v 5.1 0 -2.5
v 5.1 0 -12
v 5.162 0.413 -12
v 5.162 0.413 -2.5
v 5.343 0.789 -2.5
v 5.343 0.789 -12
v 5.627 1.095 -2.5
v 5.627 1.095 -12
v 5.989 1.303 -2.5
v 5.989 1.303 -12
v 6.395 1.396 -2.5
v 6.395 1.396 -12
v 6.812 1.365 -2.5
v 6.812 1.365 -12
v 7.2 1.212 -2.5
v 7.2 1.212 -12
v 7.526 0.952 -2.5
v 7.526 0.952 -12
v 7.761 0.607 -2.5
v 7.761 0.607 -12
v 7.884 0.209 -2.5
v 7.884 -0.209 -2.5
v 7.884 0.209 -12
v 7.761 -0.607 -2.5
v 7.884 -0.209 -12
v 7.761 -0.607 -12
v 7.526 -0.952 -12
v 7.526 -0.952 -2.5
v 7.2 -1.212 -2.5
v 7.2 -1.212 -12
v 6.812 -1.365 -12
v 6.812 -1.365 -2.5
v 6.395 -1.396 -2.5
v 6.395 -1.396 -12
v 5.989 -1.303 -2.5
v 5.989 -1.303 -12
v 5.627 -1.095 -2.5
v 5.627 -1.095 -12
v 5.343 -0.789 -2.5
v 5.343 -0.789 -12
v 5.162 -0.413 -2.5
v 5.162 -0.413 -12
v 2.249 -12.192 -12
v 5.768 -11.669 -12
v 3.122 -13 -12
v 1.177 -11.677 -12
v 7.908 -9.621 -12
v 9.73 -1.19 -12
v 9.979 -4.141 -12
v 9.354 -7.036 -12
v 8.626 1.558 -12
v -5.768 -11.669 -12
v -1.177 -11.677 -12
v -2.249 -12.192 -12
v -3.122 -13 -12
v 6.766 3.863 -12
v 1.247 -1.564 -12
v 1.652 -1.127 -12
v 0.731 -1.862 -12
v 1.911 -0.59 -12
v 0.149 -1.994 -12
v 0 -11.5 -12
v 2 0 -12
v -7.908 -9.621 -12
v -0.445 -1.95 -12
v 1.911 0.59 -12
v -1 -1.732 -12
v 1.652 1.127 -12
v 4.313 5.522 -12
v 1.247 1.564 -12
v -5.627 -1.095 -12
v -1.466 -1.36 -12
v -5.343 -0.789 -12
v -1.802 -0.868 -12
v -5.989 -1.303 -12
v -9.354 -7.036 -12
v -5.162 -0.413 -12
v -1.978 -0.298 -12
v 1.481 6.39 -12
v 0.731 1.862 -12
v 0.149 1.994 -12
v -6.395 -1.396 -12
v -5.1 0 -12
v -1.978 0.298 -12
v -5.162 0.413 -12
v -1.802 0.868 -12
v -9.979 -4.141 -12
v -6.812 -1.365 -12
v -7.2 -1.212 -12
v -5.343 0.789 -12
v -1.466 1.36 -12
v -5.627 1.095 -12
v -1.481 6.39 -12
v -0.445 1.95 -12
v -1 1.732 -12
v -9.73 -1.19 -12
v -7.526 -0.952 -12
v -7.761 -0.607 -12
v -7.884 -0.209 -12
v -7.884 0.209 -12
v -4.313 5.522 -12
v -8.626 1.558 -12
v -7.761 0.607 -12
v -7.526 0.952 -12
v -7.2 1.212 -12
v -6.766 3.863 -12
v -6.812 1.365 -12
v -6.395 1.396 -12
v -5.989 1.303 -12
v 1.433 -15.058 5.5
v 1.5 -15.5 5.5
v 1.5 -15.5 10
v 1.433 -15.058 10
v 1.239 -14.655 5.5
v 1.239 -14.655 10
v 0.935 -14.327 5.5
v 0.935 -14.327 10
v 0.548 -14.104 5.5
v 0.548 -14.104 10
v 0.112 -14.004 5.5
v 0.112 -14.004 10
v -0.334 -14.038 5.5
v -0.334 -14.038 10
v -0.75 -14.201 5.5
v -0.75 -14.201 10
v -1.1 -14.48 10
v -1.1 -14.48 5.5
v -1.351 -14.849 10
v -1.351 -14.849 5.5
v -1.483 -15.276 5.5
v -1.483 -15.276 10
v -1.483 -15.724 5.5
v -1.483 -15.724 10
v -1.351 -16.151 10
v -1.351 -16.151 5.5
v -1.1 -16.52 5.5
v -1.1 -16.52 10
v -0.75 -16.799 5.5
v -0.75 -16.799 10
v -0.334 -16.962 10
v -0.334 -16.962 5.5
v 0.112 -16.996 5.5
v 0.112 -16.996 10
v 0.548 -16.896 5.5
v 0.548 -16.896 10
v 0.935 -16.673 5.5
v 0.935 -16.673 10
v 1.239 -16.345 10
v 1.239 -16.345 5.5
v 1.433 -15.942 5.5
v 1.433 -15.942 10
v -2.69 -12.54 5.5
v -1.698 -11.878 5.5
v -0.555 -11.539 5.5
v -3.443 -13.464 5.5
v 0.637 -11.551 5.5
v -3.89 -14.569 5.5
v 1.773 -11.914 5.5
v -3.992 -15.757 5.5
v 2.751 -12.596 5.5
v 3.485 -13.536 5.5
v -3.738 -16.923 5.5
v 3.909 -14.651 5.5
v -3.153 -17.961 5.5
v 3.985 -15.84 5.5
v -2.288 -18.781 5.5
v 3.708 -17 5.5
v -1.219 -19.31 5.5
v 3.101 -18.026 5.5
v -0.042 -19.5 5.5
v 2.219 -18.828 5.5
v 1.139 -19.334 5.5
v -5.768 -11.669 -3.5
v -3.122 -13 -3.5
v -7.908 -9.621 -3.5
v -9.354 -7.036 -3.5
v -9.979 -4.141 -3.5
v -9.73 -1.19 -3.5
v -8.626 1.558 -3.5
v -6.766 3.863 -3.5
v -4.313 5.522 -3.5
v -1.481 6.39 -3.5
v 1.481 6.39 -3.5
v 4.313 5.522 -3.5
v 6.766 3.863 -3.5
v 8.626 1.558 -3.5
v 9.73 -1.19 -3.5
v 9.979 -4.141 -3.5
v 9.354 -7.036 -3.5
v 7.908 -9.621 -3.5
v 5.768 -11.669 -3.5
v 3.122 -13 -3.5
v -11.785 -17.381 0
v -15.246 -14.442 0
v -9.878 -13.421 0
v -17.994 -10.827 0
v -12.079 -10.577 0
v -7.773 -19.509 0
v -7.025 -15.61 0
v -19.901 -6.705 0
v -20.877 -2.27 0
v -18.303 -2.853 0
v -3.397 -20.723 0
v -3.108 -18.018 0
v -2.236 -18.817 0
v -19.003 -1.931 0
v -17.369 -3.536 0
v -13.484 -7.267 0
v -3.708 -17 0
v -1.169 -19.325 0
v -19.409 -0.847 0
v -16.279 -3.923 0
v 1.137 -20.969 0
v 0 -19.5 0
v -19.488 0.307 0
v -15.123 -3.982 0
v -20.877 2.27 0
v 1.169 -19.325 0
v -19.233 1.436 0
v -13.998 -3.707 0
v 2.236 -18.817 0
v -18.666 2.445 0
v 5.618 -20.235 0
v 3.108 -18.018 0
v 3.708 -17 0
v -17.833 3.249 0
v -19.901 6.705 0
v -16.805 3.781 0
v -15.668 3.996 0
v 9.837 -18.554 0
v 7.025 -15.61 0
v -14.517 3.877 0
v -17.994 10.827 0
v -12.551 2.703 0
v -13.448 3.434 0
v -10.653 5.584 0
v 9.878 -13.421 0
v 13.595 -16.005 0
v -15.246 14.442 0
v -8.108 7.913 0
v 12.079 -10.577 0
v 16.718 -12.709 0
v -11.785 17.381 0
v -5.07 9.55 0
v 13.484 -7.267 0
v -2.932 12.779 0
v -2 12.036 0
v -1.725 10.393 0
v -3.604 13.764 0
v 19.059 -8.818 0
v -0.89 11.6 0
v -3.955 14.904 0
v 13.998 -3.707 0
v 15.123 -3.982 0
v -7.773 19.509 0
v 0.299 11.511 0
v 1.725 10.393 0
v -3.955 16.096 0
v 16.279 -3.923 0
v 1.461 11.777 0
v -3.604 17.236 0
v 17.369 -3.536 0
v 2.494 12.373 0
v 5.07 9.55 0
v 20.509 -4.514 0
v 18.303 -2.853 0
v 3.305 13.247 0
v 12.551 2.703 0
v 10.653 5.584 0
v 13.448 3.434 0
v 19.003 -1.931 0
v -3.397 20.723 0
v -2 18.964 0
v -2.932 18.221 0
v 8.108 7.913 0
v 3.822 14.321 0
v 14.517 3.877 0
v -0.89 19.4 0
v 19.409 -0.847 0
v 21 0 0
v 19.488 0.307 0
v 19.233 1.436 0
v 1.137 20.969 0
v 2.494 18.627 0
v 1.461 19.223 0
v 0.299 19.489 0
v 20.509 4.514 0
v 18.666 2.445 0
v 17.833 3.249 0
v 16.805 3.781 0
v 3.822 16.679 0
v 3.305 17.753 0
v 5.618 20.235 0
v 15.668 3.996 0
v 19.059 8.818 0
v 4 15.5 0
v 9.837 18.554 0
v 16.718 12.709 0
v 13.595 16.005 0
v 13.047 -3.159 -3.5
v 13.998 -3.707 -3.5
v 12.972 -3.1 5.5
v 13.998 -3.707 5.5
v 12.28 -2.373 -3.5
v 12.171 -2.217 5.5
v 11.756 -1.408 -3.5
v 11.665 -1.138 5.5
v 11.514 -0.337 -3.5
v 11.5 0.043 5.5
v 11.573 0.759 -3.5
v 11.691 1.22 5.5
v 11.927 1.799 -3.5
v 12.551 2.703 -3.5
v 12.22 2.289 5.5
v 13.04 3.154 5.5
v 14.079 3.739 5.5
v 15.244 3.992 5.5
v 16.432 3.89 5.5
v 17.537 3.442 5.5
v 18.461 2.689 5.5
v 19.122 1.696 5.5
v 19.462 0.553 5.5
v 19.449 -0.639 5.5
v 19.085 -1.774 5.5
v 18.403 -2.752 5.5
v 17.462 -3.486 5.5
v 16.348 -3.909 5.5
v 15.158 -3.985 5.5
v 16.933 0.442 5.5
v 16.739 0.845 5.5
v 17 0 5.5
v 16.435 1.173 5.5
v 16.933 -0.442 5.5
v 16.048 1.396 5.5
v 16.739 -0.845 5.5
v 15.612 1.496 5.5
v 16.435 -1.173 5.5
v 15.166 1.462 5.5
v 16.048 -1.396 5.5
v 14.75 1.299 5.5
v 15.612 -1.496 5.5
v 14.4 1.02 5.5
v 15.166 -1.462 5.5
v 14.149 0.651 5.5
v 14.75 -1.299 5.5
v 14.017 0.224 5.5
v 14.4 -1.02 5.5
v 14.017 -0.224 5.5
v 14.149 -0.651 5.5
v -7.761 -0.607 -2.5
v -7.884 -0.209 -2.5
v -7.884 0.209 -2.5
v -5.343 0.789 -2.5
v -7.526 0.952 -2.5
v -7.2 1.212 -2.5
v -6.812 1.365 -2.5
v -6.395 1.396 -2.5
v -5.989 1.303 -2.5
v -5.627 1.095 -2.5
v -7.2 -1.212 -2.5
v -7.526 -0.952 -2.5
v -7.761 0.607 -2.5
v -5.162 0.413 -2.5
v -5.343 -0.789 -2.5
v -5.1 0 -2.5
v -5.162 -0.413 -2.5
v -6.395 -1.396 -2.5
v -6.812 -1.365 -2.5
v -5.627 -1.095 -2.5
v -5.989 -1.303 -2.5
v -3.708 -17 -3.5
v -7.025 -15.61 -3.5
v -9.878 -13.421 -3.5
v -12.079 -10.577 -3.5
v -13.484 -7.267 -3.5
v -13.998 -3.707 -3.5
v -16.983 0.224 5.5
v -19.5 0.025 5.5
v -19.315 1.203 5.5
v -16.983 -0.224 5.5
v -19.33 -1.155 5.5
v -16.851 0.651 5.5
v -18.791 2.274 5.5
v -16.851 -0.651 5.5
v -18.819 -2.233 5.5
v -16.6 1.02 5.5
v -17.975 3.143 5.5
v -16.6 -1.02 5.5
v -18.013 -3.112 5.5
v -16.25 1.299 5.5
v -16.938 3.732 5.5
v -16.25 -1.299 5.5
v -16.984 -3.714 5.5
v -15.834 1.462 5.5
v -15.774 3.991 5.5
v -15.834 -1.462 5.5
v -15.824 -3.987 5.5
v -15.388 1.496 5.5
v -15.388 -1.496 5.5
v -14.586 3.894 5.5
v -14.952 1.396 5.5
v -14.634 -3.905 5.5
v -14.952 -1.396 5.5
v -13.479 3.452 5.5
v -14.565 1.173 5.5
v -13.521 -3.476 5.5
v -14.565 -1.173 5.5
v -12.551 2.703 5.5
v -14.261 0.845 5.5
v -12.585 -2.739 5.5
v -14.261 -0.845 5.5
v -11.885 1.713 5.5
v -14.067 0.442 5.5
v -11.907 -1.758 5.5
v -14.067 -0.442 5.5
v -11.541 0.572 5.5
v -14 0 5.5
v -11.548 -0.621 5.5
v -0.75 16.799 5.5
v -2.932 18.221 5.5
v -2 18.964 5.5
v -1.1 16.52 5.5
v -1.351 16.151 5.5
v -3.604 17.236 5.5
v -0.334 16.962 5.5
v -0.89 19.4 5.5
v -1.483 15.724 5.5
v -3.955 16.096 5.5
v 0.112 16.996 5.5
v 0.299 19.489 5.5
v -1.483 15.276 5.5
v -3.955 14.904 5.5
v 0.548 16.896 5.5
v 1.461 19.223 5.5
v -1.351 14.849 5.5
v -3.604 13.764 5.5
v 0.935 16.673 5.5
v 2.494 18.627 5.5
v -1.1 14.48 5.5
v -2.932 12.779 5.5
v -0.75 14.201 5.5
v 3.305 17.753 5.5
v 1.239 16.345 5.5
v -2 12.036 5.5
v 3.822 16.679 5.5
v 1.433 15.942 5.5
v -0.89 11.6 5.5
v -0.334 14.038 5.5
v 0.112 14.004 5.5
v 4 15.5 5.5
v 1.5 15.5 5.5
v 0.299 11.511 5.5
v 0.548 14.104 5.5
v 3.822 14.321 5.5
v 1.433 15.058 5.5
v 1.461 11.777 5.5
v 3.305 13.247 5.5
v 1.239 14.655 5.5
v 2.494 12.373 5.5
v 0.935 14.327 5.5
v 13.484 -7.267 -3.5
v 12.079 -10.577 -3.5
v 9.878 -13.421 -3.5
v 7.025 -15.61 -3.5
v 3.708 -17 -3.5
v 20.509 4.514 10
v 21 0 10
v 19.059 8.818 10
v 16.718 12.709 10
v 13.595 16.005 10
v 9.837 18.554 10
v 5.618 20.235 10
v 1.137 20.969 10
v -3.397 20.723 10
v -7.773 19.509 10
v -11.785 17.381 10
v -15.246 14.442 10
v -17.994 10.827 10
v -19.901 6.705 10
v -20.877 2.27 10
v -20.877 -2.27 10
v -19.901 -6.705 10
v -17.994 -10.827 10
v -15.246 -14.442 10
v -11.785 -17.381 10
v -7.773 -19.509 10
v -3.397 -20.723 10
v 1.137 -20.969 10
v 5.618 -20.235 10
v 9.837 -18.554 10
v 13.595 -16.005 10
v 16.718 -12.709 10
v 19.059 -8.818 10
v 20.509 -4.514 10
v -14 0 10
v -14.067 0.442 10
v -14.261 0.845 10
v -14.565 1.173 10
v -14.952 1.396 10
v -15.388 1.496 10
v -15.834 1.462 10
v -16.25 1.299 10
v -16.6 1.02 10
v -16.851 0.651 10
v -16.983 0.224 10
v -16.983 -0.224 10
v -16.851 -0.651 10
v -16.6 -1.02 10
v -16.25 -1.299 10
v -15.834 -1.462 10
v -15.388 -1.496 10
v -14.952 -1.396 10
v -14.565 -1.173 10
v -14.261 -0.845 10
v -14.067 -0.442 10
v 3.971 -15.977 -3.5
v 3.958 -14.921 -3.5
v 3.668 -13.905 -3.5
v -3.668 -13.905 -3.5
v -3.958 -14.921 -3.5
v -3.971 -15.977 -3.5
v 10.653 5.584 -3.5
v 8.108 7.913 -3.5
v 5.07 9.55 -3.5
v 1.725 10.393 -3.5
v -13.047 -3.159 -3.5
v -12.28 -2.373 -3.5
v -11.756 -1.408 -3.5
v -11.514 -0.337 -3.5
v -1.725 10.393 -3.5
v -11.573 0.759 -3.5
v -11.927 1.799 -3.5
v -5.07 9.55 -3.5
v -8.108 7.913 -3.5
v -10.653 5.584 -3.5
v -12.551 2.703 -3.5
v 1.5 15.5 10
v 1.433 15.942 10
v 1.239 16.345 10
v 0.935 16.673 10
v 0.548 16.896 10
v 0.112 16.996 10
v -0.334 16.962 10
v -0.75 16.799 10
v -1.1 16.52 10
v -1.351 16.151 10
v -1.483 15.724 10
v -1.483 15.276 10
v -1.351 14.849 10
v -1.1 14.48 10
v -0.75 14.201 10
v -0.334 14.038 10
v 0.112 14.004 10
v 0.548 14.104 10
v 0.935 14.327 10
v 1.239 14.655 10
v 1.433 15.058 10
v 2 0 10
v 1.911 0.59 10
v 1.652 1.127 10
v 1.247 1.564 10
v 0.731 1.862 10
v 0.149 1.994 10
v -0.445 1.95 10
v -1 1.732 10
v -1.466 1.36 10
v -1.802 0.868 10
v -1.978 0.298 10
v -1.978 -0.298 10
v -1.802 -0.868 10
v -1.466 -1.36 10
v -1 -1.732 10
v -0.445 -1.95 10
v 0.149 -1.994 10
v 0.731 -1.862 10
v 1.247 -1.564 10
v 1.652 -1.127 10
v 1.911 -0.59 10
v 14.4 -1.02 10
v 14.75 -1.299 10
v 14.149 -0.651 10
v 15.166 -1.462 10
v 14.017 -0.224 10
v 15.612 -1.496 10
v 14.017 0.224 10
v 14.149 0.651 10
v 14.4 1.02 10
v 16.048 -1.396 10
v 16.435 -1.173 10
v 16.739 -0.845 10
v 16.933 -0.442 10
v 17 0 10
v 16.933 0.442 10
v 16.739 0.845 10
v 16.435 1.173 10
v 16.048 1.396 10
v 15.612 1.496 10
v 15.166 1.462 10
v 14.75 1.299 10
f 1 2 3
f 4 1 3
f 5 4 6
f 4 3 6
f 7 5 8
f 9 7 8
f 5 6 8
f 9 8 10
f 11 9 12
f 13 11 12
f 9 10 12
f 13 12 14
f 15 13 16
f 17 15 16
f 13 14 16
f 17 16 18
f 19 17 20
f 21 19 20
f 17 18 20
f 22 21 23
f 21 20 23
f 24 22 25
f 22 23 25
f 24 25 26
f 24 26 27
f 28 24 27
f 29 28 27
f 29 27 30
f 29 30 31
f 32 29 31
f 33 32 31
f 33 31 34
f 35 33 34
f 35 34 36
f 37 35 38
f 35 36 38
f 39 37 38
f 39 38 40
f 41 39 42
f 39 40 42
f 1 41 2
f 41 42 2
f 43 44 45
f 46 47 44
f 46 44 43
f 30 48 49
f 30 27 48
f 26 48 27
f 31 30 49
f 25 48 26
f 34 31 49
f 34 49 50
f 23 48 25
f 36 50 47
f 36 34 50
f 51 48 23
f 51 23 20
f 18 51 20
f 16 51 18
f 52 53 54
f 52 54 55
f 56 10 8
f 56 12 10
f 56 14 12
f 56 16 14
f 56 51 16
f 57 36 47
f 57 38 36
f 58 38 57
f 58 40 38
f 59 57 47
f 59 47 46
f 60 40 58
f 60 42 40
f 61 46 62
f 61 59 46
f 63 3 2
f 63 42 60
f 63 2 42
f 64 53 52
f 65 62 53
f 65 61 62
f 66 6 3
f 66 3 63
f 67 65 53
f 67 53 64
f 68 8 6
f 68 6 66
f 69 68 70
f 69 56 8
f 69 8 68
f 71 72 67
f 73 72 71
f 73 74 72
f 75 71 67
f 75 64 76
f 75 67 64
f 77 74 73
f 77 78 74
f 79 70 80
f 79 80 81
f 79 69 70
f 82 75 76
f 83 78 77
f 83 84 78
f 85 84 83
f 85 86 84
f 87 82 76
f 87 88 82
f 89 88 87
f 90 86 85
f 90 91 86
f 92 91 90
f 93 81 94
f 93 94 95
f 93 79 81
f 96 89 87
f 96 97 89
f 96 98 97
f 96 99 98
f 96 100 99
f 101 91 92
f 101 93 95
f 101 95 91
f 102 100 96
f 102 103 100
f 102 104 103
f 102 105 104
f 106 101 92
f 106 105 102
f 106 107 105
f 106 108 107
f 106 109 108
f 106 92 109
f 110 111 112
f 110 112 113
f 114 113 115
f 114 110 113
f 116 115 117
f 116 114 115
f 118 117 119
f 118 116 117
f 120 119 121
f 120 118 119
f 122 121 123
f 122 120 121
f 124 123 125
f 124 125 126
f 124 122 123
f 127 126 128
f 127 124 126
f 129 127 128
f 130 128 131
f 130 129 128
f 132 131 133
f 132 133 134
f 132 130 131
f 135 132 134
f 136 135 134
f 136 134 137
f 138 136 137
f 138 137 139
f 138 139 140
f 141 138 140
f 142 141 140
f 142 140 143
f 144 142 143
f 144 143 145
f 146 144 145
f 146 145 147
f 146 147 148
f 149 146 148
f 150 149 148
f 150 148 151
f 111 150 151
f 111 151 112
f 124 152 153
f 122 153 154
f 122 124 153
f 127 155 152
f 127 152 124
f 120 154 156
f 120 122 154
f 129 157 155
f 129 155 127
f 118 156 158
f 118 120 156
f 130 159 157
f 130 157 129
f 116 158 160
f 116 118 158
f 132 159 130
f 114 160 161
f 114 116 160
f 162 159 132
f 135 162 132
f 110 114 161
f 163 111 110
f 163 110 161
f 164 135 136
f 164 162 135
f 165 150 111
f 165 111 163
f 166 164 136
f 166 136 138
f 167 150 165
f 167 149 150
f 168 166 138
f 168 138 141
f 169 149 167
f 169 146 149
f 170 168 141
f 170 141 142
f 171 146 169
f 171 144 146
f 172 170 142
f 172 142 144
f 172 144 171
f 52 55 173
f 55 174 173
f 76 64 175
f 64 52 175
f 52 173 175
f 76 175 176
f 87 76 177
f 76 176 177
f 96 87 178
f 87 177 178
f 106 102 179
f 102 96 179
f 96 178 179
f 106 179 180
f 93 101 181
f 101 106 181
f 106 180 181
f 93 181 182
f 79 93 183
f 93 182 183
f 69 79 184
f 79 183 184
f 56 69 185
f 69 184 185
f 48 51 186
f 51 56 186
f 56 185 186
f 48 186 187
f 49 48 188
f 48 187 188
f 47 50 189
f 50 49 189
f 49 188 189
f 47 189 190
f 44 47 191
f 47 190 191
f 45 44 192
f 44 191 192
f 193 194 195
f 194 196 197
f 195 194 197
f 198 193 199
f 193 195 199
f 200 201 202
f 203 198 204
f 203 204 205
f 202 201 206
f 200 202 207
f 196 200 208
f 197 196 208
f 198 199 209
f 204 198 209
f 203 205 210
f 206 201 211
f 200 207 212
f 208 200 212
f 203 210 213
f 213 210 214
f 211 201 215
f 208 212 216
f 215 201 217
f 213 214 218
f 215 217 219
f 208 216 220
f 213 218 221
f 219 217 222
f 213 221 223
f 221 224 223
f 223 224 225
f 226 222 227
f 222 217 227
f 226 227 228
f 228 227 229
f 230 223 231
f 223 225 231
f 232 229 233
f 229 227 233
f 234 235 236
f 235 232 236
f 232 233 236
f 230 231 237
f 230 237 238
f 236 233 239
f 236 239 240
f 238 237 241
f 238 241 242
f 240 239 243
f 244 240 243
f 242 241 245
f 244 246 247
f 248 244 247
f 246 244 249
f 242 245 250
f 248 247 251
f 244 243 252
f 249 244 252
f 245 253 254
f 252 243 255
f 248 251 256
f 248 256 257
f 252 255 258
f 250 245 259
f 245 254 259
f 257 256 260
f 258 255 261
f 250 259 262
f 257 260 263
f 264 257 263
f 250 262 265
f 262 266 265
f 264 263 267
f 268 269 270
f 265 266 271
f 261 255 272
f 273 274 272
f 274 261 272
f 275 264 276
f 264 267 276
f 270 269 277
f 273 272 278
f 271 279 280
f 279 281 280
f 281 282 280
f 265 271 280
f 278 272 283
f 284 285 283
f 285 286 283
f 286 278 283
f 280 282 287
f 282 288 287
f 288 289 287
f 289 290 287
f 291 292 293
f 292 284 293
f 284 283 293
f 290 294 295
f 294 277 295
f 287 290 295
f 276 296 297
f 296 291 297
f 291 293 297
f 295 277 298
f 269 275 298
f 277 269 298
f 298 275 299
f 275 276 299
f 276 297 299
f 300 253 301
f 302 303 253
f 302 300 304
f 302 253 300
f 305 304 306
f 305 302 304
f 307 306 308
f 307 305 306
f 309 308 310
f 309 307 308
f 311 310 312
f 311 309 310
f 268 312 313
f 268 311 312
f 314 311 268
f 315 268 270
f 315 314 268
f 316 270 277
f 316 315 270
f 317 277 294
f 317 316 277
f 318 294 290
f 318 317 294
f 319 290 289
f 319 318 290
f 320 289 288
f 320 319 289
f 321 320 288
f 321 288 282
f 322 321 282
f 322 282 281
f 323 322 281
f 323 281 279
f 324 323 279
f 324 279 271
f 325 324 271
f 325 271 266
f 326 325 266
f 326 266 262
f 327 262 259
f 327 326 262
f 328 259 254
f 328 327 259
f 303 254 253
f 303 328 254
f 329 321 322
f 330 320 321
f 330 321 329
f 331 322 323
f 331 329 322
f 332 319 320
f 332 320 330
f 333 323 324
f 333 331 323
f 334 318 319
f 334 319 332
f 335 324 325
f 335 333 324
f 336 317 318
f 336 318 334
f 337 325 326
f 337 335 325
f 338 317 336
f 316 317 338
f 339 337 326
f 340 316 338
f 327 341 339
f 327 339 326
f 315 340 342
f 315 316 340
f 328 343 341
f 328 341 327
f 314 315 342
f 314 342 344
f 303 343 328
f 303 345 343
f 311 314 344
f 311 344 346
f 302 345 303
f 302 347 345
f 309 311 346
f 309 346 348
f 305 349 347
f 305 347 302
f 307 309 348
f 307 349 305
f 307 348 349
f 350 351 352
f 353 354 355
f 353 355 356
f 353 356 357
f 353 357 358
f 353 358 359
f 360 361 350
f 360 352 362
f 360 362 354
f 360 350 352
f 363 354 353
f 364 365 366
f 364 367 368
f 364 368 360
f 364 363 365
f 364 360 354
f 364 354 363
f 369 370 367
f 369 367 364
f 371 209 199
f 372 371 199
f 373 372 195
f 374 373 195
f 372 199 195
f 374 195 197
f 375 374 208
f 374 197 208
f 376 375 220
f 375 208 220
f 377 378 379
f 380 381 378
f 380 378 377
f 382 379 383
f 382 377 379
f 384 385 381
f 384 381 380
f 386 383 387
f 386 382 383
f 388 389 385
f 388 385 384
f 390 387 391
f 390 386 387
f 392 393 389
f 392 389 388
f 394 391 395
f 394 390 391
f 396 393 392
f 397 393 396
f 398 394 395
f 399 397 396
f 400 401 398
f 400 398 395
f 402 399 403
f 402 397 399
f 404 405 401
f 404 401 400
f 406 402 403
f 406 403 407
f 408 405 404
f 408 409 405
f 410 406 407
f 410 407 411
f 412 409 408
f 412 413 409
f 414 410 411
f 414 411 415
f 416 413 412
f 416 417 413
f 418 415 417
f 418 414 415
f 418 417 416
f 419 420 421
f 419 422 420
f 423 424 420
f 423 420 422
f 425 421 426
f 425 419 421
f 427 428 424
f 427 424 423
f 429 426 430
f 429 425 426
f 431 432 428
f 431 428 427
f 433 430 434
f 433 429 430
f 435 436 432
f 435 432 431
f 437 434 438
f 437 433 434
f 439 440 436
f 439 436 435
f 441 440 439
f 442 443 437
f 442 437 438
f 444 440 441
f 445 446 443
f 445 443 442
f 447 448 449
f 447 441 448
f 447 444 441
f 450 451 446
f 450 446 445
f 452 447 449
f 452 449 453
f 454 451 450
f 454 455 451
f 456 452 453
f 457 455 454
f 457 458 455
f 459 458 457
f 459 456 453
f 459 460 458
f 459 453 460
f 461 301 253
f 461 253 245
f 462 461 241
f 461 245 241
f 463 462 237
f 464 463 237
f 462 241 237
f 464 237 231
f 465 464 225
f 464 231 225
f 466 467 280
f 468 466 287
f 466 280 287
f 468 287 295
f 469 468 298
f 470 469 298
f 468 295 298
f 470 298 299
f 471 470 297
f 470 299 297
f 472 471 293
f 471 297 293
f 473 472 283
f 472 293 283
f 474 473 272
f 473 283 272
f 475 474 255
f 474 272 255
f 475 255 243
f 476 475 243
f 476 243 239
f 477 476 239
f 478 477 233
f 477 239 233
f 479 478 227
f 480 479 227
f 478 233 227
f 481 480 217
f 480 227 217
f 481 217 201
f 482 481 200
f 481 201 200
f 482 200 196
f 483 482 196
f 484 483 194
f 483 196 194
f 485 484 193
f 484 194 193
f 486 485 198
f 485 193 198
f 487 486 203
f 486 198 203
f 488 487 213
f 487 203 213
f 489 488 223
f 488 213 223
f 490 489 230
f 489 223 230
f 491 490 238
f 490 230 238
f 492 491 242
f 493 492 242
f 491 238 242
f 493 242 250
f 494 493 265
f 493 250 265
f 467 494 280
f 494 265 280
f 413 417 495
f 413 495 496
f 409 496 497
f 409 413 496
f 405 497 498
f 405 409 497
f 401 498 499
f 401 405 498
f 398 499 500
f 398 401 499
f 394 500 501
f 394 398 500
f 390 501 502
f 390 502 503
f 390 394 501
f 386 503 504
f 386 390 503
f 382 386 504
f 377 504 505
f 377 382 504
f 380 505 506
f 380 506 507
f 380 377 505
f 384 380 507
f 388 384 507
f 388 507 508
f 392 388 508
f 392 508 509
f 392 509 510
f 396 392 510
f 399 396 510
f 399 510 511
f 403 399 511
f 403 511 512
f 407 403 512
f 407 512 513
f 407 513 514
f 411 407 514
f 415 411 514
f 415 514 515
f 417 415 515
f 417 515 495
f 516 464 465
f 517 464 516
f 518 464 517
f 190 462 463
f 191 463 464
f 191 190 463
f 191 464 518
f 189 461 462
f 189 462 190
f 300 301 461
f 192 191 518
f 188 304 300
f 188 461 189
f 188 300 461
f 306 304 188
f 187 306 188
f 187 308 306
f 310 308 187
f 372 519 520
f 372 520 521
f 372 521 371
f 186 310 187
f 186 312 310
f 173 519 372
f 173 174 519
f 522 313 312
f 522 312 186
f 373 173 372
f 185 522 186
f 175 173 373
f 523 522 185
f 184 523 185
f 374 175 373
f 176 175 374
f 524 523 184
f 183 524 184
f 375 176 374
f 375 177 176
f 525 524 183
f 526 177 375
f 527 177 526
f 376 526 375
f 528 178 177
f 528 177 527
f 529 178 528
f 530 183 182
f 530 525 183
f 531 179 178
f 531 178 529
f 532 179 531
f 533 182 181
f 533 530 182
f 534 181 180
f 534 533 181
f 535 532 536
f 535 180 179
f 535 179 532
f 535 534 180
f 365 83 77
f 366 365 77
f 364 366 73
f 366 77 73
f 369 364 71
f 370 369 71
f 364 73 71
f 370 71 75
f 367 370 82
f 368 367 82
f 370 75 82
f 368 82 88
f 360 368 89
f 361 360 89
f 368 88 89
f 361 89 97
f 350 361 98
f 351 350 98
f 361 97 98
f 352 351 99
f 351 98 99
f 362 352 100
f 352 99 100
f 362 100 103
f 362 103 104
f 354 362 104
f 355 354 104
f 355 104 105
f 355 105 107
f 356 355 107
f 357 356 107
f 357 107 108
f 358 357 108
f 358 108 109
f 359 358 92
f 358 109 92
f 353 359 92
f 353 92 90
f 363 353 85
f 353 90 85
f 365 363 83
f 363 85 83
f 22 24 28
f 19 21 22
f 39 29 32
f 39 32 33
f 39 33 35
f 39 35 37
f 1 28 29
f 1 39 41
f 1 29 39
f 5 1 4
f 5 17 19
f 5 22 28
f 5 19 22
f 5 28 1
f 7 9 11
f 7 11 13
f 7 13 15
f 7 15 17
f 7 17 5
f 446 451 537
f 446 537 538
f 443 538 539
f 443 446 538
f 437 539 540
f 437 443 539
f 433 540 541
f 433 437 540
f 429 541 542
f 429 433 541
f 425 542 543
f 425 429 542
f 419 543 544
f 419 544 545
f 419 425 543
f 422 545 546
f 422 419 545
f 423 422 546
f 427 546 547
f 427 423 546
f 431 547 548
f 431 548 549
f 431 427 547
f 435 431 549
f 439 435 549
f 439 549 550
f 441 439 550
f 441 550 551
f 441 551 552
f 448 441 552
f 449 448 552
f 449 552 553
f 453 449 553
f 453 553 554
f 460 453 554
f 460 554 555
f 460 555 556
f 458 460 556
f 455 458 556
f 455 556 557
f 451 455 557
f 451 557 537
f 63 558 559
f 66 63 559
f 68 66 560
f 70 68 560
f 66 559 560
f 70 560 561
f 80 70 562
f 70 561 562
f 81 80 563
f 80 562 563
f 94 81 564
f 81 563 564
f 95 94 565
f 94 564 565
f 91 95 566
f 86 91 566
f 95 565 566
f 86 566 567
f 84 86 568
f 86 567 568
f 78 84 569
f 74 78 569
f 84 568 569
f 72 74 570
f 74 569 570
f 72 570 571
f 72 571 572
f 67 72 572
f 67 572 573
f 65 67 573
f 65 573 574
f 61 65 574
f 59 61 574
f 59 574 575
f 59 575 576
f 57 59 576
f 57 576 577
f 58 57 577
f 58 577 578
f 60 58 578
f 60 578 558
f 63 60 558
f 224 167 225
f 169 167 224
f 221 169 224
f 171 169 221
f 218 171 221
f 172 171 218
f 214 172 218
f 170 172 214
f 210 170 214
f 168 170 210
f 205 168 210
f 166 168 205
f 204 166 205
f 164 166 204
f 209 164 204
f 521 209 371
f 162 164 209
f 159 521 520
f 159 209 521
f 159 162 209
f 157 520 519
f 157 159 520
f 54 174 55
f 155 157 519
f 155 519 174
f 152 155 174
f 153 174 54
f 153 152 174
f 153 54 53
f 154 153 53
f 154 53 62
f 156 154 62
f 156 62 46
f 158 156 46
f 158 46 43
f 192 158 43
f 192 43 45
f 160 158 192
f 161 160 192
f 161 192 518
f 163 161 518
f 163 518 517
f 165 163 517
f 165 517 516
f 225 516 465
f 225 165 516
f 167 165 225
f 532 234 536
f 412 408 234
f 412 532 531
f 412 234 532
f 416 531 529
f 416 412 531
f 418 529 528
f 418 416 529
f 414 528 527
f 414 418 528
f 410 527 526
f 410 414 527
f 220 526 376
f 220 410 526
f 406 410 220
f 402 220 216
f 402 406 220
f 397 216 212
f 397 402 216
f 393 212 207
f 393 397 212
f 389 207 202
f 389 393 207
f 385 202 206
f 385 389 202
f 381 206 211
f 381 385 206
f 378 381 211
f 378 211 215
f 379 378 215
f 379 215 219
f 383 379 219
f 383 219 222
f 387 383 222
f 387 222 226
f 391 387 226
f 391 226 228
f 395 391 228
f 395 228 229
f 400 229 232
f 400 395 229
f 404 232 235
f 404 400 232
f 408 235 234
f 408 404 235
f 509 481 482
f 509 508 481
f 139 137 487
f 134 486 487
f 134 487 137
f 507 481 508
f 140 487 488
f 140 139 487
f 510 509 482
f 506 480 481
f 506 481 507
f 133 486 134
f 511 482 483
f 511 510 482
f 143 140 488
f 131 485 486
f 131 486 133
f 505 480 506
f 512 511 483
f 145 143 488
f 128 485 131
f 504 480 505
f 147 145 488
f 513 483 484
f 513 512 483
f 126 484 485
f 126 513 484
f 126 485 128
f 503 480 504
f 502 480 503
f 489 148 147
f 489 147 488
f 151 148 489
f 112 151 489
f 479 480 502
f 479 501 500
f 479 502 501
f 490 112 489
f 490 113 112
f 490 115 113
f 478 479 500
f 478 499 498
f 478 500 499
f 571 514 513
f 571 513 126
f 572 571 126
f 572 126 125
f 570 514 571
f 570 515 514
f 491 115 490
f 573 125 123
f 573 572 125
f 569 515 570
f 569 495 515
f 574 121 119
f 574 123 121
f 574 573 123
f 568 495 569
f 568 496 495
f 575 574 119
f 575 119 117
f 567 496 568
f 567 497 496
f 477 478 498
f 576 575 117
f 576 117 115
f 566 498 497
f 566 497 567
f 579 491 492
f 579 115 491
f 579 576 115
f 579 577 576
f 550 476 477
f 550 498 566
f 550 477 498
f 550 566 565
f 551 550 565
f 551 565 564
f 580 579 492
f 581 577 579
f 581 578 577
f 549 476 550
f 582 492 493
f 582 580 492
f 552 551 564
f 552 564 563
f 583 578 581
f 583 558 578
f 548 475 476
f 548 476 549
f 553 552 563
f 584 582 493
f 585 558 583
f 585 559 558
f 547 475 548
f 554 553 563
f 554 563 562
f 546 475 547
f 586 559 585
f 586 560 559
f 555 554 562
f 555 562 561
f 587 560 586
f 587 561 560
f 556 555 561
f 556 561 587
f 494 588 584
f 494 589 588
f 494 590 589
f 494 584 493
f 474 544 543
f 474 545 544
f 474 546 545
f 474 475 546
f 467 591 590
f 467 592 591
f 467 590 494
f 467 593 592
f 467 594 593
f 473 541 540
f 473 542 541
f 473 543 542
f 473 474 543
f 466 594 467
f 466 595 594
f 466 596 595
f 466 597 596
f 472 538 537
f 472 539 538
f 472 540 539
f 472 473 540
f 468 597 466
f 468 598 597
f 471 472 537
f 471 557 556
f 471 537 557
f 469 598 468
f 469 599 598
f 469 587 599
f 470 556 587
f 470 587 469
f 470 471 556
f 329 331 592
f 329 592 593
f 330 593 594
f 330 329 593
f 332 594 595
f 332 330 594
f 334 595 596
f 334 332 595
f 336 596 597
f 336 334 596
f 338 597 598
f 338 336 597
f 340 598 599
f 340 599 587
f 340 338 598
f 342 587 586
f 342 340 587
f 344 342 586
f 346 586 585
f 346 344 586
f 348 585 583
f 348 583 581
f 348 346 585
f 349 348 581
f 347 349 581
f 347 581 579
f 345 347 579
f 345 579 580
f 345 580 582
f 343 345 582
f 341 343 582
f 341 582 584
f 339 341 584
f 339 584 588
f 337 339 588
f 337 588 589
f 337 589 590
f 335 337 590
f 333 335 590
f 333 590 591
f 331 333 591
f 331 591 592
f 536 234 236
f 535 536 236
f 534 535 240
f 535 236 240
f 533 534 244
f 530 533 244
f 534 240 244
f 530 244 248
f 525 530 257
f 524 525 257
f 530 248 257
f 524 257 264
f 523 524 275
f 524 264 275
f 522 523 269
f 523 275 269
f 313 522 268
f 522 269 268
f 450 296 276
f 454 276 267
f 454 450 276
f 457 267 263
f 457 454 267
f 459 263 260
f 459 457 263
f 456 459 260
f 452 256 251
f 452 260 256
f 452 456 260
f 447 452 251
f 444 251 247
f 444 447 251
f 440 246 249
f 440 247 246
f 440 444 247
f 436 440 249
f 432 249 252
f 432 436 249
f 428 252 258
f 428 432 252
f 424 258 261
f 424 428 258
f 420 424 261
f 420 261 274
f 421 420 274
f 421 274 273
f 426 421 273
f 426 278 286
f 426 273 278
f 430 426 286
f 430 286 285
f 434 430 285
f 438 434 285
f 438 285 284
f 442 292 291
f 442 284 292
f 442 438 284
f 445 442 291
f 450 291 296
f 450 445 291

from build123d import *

# Parameters (mm, degrees)
SKETCH_1_R               = 21
SKETCH_1_R_2             = 1.5
EXTRUDE_1_DEPTH          = 10
SKETCH_2_R               = 14
EXTRUDE_2_DEPTH          = 3.5
SKETCH_3_R               = 10
EXTRUDE_3_DEPTH          = 8.5
SKETCH_5_R               = 2
CUT_EXTRUDE_1_DEPTH      = 28
SKETCH_4_R               = 1.4
CUT_EXTRUDE_2_DEPTH      = 9.5
CUT_EXTRUDE_3_DEPTH      = 15.5
CUT_EXTRUDE_3_DEPTH_BACK = 5.5
SKETCH_6_R               = 4


with BuildPart() as part:
    # 草图1 → 凸台-拉伸1 (new body)
    with BuildSketch(Plane.XY):
        Circle(SKETCH_1_R)
        with Locations((0, -15.5)):
            Circle(SKETCH_1_R_2, mode=Mode.SUBTRACT)
        with Locations((-15.5, 0)):
            Circle(SKETCH_1_R_2, mode=Mode.SUBTRACT)
        with Locations((0, 15.5)):
            Circle(SKETCH_1_R_2, mode=Mode.SUBTRACT)
        with Locations((15.5, 0)):
            Circle(SKETCH_1_R_2, mode=Mode.SUBTRACT)
    extrude(amount=EXTRUDE_1_DEPTH)

    # 草图2 → 凸台-拉伸2 (add)
    with BuildSketch(Plane(origin=(0, 0, 0), x_dir=(-1, 0, 0), z_dir=(0, 0, -1))):
        with Locations((0, -3.5)):
            Circle(SKETCH_2_R)
    extrude(amount=EXTRUDE_2_DEPTH)

    # 草图3 → 凸台-拉伸3 (add)
    with BuildSketch(Plane(origin=(0, 0, -3.5), x_dir=(-1, 0, 0), z_dir=(0, 0, -1))):
        with Locations((0, -3.5)):
            Circle(SKETCH_3_R)
    extrude(amount=EXTRUDE_3_DEPTH)

    # 草图5 → 切除-拉伸1 (cut)
    with BuildSketch(Plane.XY.offset(10)):
        Circle(SKETCH_5_R)
    extrude(amount=-CUT_EXTRUDE_1_DEPTH, mode=Mode.SUBTRACT)

    # 草图4 → 切除-拉伸2 (cut)
    with BuildSketch(Plane(origin=(0, 0, -12), x_dir=(-1, 0, 0), z_dir=(0, 0, -1))):
        with Locations((-6.5, 0)):
            Circle(SKETCH_4_R)
        with Locations(Location((6.5, 0, 0), (0, 0, 180))):
            Circle(SKETCH_4_R)
    extrude(amount=-CUT_EXTRUDE_2_DEPTH, mode=Mode.SUBTRACT)

    # 草图6 → 切除-拉伸3 (cut, two sides: drawn at the far end of the back side and taken through both)
    with BuildSketch(Plane(origin=(0, 0, 0), x_dir=(-1, 0, 0), z_dir=(0, 0, -1)).offset(-CUT_EXTRUDE_3_DEPTH_BACK)):
        with Locations(Location((0, 15.5, 0), (0, 0, 180))):
            Circle(SKETCH_6_R)
        with Locations(Location((15.5, 0, 0), (0, 0, 137.496782389))):
            Circle(SKETCH_6_R)
        with Locations(Location((0, -15.5, 0), (0, 0, 202.024312837))):
            Circle(SKETCH_6_R)
        with Locations(Location((-15.5, 0, 0), (0, 0, 292.048071018))):
            Circle(SKETCH_6_R)
    extrude(amount=CUT_EXTRUDE_3_DEPTH + CUT_EXTRUDE_3_DEPTH_BACK, mode=Mode.SUBTRACT)


solid = part.part
